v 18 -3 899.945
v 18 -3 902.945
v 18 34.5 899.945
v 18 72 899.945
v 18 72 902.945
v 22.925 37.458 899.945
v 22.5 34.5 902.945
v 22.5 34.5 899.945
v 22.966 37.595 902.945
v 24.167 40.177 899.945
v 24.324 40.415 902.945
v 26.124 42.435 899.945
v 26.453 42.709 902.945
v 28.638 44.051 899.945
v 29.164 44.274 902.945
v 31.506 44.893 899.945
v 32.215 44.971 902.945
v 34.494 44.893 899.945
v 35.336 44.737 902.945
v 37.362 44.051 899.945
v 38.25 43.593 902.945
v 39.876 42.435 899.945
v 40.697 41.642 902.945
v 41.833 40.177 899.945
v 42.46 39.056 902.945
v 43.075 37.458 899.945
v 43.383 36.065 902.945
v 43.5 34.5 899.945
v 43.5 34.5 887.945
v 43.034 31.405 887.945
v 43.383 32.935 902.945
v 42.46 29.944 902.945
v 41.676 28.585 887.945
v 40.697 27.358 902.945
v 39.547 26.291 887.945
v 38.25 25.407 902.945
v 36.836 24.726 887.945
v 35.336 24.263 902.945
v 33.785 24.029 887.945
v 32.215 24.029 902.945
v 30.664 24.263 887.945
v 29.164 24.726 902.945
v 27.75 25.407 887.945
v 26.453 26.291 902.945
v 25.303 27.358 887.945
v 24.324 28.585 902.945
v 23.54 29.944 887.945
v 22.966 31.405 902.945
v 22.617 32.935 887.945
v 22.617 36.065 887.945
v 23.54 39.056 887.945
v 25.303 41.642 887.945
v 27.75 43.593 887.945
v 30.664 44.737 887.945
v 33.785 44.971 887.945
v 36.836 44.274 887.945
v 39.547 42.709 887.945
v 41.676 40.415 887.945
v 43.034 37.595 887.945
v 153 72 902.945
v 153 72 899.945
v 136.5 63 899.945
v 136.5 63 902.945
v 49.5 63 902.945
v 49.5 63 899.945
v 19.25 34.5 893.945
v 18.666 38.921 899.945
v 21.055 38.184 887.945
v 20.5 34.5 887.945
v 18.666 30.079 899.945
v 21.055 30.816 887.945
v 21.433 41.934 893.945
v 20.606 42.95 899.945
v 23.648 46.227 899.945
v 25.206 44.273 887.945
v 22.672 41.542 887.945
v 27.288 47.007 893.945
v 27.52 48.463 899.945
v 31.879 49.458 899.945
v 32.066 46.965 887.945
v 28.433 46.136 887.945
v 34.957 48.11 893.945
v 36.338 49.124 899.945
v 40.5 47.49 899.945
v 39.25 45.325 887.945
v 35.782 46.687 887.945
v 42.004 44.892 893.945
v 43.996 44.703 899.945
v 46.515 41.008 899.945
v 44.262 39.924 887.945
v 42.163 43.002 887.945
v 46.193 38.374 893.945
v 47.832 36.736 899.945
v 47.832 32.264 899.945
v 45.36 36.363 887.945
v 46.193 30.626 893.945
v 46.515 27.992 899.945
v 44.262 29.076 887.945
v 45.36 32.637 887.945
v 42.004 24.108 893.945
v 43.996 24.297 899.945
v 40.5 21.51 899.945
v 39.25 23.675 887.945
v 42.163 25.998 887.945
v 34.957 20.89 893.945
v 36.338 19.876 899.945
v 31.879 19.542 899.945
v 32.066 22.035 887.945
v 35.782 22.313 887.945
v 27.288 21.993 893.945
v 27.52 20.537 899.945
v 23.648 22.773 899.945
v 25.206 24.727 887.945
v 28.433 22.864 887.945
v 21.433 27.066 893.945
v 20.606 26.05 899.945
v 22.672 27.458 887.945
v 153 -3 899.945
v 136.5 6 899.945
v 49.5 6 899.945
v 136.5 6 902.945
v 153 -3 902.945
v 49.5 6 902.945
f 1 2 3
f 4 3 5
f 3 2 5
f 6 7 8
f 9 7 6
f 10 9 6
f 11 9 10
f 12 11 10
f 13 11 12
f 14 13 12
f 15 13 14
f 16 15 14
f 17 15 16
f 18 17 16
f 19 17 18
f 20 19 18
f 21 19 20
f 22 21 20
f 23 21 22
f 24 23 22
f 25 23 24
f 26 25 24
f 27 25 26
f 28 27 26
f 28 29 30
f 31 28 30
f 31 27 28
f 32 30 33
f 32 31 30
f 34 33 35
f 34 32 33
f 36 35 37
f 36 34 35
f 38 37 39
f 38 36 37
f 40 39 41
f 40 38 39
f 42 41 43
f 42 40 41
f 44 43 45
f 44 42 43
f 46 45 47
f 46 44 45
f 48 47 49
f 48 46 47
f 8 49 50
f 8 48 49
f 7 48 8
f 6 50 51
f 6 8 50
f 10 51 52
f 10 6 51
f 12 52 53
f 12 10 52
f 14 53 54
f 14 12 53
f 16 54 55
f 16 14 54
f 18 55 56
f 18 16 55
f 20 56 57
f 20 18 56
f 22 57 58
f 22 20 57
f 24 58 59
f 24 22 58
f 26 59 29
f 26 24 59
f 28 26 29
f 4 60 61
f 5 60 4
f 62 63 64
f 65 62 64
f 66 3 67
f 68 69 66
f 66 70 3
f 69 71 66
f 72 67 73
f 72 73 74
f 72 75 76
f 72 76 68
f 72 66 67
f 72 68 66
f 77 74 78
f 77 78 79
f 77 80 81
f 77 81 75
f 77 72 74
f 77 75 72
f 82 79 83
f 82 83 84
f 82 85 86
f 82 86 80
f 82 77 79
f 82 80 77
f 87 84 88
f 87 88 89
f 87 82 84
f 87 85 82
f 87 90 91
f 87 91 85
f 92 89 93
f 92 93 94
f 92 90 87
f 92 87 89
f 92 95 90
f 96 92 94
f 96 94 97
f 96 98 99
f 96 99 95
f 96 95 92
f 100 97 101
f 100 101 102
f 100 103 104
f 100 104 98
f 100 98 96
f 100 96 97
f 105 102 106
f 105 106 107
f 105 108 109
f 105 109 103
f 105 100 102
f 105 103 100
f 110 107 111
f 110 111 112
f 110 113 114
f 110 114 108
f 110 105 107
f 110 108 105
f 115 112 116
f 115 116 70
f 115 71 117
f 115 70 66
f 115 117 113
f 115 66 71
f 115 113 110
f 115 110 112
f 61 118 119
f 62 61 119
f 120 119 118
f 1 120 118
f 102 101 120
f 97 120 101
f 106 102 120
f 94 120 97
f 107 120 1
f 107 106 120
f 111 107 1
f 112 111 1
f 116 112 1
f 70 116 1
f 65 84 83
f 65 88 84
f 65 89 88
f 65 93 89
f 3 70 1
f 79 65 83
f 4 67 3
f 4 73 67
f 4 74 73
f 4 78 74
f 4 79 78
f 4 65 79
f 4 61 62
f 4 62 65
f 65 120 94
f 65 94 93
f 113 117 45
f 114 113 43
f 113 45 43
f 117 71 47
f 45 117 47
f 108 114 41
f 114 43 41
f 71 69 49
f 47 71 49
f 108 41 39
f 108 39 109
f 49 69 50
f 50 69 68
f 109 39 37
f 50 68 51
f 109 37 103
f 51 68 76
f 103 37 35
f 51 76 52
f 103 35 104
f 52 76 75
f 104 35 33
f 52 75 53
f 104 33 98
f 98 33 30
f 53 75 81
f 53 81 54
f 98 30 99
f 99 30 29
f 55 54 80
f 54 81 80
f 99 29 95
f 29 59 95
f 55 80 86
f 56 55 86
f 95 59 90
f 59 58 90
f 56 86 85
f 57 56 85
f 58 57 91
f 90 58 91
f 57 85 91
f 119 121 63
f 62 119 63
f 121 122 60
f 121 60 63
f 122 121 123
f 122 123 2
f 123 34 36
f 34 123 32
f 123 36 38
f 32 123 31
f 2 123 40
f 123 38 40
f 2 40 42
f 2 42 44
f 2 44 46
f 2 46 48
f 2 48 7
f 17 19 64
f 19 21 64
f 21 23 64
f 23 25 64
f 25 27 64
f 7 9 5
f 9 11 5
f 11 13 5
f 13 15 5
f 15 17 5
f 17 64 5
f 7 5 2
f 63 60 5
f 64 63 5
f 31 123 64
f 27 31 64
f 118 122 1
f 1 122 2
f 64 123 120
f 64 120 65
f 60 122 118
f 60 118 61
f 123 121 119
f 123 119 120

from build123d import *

# Parameters (mm, degrees)
SKETCH_1_W          = 135
SKETCH_1_H          = 75
SKETCH_1_R          = 10.5
SKETCH_1_W_2        = 87
SKETCH_1_H_2        = 57
EXTRUDE_1_DEPTH     = 3
SKETCH_5_R          = 15
SKETCH_4_R          = 12.5
CUT_EXTRUDE_1_REACH = 171.52
SKETCH_5_93_R       = 10.5


with BuildPart() as part:
    # 草图1 → 凸台-拉伸1 (new body)
    with BuildSketch(Plane(origin=(0, 0, 902.944534426), x_dir=(-1, 0, 0), z_dir=(0, 0, -1))):
        with Locations((-85.5, 34.5)):
            Rectangle(SKETCH_1_W, SKETCH_1_H)
        with Locations((-33, 34.5)):
            Circle(SKETCH_1_R, mode=Mode.SUBTRACT)
        with Locations((-93, 34.5)):
            Rectangle(SKETCH_1_W_2, SKETCH_1_H_2, mode=Mode.SUBTRACT)
    extrude(amount=EXTRUDE_1_DEPTH)

    # 草图5 → 放样4 section 0
    with BuildSketch(Plane(origin=(0, 0, 899.944534426), x_dir=(-1, 0, 0), z_dir=(0, 0, -1))):
        with Locations((-33, 34.5)):
            Circle(SKETCH_5_R)
    # 草图4 → 放样4 section 1
    with BuildSketch(Plane.XY.offset(887.944534426)):
        with Locations((33, 34.5)):
            Circle(SKETCH_4_R)
    loft()

    # 草图5<93> → 切除-拉伸1 (cut, up to next)
    with BuildSketch(Plane(origin=(0, 0, 899.944534426), x_dir=(-1, 0, 0), z_dir=(0, 0, -1)), mode=Mode.PRIVATE) as cut_extrude_1_sk1:
        with Locations(Location((-33, 34.5, 0), (0, 0, 180))):
            Circle(SKETCH_5_93_R)
    cut_extrude_1_tool1 = extrude(cut_extrude_1_sk1.sketch, amount=CUT_EXTRUDE_1_REACH, mode=Mode.PRIVATE) & part.part
    add(cut_extrude_1_tool1.solids().sort_by_distance((33, 34.5, 899.944534))[0], mode=Mode.SUBTRACT)


solid = part.part
